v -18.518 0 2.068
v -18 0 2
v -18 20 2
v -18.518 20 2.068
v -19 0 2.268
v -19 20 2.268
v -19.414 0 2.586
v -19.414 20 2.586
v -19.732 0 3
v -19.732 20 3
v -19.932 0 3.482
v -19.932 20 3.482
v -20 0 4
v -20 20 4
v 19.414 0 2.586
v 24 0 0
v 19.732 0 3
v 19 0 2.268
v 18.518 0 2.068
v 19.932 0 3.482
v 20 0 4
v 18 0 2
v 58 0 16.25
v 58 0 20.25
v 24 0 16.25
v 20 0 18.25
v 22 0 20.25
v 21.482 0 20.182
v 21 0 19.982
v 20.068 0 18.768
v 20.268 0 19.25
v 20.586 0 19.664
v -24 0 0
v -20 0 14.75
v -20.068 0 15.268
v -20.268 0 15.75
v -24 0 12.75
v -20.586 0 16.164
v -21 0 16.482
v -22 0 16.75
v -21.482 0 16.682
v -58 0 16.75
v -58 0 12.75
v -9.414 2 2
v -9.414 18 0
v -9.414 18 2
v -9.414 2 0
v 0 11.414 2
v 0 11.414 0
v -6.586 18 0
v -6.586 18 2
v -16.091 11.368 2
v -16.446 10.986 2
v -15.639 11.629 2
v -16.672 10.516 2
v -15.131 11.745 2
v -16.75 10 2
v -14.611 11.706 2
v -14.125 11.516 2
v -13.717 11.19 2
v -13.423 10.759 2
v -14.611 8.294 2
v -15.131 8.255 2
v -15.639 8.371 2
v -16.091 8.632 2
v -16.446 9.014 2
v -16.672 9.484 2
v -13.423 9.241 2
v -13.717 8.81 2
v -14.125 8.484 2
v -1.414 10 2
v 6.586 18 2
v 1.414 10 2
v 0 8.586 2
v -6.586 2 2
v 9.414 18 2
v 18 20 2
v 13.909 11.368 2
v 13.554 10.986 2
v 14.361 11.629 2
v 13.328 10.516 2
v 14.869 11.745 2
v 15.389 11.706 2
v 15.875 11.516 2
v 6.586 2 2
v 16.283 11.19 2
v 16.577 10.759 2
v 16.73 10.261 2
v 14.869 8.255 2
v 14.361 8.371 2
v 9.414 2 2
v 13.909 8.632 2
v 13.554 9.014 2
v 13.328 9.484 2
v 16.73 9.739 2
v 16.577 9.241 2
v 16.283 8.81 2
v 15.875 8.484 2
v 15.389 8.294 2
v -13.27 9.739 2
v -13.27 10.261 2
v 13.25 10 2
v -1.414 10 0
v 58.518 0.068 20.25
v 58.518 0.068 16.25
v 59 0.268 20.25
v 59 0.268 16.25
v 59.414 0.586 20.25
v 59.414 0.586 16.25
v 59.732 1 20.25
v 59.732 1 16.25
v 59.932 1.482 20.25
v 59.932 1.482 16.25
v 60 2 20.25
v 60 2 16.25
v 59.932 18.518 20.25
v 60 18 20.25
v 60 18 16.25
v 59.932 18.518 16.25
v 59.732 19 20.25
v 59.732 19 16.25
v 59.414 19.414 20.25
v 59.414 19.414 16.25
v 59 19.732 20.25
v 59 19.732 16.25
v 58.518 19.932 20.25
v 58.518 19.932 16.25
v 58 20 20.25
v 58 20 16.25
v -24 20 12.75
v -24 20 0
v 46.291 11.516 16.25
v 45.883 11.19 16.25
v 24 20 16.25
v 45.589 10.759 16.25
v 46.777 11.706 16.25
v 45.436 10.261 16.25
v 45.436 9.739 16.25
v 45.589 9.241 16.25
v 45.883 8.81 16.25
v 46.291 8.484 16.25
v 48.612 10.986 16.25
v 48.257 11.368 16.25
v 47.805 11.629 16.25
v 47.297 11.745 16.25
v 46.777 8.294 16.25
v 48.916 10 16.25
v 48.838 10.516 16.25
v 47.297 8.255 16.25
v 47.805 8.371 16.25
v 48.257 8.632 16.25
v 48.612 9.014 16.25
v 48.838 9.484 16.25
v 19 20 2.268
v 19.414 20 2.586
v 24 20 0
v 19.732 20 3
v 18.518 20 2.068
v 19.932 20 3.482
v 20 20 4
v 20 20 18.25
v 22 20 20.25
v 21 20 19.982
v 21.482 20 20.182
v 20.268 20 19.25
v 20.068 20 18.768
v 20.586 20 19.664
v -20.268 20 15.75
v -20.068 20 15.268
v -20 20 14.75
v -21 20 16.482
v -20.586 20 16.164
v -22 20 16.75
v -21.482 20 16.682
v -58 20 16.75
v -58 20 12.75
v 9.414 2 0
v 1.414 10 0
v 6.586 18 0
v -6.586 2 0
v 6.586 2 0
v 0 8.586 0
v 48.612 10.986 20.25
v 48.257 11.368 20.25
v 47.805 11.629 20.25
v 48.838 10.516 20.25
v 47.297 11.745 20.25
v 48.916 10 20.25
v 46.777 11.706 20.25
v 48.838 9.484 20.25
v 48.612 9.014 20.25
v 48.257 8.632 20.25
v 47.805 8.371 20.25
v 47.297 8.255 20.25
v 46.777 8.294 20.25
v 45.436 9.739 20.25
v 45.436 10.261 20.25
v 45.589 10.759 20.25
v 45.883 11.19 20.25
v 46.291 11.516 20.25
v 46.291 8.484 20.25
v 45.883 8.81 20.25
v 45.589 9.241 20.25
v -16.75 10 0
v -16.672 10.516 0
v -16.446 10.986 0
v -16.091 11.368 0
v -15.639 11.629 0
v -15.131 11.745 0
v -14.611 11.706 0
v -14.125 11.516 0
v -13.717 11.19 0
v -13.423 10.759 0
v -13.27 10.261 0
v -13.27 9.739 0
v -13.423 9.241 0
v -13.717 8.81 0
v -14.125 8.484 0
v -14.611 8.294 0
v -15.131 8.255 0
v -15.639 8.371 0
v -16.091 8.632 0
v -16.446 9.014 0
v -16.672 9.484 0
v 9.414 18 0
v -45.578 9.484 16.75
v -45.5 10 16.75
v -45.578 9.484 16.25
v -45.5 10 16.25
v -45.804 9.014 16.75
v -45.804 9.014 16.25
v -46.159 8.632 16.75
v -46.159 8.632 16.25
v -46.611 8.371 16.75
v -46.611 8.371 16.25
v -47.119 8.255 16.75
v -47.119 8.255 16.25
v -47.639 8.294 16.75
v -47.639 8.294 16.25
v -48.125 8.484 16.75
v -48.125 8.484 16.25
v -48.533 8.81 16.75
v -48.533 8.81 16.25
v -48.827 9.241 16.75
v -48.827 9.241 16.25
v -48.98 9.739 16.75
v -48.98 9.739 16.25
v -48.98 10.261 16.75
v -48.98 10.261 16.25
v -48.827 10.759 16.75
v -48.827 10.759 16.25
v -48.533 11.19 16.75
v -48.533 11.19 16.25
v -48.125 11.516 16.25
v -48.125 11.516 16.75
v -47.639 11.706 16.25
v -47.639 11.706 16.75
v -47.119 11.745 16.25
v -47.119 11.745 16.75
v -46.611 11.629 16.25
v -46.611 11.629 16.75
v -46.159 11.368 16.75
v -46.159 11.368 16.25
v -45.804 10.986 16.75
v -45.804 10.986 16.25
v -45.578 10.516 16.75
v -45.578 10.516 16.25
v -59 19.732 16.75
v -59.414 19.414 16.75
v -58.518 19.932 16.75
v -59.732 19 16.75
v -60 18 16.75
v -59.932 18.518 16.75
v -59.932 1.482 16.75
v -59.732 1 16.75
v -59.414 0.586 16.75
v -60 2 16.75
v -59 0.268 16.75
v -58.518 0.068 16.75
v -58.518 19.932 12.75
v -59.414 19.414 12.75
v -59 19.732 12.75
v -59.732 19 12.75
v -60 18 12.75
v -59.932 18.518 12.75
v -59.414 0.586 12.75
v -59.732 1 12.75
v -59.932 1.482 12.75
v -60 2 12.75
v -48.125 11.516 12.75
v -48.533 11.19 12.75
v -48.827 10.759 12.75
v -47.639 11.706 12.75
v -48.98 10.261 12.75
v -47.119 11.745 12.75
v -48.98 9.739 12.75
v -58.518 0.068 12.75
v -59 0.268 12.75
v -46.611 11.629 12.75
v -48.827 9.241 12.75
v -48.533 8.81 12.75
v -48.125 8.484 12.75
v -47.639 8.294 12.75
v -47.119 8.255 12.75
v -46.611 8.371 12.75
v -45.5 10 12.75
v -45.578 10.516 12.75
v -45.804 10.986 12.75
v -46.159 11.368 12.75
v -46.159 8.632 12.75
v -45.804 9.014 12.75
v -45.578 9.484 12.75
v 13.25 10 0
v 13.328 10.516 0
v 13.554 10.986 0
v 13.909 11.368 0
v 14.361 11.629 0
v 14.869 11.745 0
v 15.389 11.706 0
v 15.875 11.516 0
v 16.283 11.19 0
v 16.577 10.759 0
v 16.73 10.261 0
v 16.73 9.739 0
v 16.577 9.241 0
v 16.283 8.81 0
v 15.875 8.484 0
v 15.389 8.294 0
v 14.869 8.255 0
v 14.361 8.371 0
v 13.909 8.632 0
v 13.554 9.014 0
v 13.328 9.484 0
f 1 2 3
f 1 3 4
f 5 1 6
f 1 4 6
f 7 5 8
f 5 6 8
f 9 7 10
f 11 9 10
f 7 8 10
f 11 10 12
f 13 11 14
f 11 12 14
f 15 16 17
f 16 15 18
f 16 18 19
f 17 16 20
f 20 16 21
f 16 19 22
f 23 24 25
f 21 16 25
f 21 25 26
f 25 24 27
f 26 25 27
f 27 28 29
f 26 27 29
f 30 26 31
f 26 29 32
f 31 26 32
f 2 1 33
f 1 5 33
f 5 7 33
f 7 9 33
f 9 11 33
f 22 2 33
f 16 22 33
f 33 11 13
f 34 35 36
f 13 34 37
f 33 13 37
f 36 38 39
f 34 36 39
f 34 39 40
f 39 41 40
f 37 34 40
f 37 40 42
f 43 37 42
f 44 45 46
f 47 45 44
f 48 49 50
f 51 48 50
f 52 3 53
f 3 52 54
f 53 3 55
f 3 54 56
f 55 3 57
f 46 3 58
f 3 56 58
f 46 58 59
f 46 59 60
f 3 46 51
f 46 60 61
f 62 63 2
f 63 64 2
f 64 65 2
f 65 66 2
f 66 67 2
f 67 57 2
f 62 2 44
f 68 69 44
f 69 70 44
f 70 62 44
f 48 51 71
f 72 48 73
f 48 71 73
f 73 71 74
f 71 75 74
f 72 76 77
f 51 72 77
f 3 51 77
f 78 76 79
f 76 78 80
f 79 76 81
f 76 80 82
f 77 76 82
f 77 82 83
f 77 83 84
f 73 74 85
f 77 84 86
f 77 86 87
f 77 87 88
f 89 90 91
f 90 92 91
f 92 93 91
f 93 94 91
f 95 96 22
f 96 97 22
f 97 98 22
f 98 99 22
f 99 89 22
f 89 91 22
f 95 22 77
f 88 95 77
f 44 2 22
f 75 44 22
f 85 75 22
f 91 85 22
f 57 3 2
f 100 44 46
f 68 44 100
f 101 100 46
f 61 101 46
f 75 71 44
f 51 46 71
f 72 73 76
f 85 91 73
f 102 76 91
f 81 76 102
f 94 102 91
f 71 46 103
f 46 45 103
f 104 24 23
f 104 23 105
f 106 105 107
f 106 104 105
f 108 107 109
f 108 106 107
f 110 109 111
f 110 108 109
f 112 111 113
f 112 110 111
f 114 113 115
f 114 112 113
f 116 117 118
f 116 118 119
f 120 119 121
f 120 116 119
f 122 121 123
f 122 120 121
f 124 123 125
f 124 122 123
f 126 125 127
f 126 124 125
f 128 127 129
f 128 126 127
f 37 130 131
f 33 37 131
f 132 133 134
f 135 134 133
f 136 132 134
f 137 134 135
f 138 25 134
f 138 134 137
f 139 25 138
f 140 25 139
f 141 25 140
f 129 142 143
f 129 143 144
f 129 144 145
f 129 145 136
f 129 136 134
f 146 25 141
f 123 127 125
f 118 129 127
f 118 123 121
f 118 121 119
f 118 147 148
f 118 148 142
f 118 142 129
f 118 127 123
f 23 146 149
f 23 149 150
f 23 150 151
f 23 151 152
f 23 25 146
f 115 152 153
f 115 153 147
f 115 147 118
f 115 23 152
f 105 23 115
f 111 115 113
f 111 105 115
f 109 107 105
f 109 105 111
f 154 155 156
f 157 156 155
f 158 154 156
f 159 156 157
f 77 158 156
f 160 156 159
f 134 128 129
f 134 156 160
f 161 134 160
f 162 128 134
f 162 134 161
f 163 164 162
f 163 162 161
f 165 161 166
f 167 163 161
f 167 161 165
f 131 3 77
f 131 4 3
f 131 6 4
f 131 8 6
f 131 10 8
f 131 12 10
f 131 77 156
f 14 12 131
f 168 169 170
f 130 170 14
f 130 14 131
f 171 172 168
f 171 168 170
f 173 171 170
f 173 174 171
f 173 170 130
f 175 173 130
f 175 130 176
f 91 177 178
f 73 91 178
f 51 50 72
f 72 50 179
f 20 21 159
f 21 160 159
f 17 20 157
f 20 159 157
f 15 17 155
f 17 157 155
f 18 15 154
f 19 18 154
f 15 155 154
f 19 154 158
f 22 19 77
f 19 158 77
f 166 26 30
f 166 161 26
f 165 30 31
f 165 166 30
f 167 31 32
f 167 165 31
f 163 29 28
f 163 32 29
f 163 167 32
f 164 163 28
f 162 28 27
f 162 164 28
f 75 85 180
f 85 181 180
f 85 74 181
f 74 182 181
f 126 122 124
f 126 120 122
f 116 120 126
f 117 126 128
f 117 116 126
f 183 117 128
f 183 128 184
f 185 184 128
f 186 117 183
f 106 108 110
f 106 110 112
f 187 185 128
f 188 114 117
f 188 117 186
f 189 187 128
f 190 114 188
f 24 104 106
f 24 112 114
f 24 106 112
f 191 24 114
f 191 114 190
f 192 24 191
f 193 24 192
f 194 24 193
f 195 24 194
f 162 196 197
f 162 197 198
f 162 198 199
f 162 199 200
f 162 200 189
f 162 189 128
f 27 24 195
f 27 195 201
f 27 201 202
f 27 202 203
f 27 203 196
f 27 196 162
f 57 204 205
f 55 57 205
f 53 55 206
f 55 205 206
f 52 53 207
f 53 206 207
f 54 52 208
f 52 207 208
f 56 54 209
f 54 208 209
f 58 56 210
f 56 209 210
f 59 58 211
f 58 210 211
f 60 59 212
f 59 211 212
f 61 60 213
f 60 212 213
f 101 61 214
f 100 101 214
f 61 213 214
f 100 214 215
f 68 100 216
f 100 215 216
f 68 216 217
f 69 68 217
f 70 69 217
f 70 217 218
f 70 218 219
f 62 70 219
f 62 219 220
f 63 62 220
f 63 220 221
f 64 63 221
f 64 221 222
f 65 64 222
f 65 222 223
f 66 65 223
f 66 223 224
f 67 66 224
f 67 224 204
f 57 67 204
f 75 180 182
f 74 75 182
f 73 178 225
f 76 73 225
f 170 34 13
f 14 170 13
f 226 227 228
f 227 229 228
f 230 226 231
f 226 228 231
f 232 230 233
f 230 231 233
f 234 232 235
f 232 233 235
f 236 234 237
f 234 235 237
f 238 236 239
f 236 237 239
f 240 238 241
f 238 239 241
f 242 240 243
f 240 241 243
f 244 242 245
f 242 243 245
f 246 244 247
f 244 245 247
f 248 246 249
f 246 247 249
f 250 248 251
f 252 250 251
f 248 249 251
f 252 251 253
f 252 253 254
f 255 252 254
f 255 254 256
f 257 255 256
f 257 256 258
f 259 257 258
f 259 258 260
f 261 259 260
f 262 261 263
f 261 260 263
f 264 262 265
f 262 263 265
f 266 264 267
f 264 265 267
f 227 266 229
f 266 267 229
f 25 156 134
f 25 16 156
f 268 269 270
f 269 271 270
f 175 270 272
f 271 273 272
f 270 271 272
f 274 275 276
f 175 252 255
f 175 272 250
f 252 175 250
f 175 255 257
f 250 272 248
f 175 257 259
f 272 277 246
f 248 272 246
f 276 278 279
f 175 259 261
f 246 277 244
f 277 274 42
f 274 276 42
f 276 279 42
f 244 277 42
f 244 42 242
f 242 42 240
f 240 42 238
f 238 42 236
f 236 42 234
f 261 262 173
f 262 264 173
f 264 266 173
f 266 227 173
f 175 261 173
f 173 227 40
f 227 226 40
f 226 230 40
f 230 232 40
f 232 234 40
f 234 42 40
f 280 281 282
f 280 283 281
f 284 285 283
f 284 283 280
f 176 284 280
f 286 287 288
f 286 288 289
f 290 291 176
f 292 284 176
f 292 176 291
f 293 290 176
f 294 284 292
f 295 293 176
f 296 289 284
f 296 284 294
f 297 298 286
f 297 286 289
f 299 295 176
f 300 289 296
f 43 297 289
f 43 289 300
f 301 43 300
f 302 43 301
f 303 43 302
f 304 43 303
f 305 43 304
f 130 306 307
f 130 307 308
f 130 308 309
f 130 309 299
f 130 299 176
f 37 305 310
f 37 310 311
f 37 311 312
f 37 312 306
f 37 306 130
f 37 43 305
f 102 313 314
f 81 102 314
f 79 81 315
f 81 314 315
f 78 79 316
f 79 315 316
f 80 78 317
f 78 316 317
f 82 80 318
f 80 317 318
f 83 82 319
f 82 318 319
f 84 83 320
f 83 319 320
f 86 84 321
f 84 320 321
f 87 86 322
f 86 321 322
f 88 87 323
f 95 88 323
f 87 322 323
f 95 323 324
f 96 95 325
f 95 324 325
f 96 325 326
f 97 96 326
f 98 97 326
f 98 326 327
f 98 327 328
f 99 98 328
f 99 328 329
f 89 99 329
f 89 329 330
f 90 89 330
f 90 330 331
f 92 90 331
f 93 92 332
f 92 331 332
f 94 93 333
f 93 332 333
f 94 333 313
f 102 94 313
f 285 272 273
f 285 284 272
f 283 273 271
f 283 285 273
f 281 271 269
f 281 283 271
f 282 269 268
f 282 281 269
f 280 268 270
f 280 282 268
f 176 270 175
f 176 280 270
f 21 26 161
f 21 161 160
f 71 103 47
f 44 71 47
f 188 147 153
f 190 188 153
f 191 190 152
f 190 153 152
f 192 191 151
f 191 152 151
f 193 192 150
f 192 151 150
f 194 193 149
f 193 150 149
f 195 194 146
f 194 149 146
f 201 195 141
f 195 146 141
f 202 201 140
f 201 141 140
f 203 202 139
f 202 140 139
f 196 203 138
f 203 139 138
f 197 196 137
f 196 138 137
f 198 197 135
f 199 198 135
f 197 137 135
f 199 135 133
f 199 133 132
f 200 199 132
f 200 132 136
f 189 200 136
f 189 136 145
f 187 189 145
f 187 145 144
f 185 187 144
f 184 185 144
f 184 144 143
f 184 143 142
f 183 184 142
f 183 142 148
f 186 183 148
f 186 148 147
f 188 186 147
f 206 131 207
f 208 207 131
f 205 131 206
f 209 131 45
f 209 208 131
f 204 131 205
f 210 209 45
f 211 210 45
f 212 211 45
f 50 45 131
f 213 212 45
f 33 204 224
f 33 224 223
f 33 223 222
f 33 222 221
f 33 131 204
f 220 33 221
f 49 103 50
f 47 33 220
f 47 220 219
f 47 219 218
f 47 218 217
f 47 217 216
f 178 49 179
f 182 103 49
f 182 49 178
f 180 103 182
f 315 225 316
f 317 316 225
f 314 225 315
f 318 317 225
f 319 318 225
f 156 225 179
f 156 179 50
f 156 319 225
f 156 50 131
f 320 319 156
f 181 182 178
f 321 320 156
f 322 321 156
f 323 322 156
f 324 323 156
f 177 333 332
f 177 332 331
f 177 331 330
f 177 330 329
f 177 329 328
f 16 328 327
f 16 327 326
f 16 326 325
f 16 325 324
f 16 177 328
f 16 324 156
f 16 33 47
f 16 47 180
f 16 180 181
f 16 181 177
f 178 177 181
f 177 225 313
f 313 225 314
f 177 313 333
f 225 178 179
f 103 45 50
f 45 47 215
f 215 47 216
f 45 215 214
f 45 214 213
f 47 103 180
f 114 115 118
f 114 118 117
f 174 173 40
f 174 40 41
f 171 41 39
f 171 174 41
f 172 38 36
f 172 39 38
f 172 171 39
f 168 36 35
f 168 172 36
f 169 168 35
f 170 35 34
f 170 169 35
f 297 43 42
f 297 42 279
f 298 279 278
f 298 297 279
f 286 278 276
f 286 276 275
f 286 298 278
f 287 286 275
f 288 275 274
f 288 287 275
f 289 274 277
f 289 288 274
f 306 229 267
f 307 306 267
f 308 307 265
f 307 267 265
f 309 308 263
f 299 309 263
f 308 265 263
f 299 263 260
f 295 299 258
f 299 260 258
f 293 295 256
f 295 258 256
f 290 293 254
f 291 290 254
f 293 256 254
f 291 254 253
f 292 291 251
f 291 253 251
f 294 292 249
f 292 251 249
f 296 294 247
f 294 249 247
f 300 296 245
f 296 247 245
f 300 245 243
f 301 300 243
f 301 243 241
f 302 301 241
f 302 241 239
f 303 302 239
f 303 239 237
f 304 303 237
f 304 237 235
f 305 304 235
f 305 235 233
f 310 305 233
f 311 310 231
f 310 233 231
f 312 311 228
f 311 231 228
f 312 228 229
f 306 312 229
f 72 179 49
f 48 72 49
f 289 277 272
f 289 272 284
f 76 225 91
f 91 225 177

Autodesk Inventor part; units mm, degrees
ref_plane "YZ Plane" through (0, 0, 0) normal (1, 0, 0) x (0, 1, 0)
ref_plane "XZ Plane" through (0, 0, 0) normal (0, 1, 0) x (-1, 0, 0)
ref_plane "XY Plane" through (0, 0, 0) normal (0, 0, 1) x (1, 0, 0)
sketch "スケッチ1" plane through (0, 0, 0) normal (0, 1, 0) x (-1, 0, 0)
  line L0 (0, 20.7547) -> (0, -42.4528)
  line L1 (60, 16.75) -> (20, 16.75)
  line L2 (20, 16.75) -> (20, 2)
  line L3 (20, 2) -> (0, 2)
  line L4 (60, 16.75) -> (60, 12.75)
  line L5 (60, 12.75) -> (24, 12.75)
  line L6 (24, 12.75) -> (24, 0)
  line L7 (24, 0) -> (0, 0)
  line L8 (-20, 2) -> (0, 2)
  line L9 (-24, 0) -> (0, 0)
  line L10 (-24, 0) -> (-24, 16.25)
  line L11 (-24, 16.25) -> (-60, 16.25)
  line L12 (-60, 16.25) -> (-60, 20.25)
  line L13 (-60, 20.25) -> (-20, 20.25)
  line L14 (-20, 20.25) -> (-20, 2)
  dimension "d0" = 40
  dimension "d1" = 4
  dimension "d2" = 36
  dimension "d4" = 2
  dimension "d5" = 40
  dimension "d20" = 12.75
  dimension "d21" = 16.25
  dimension "d22" = 4
  dimension "d23" = 40
  dimension "d24" = 4
extrude "押し出し1" add sketch "スケッチ1" along normal blind 20
sketch "スケッチ2" plane through (24, 0, 0) normal (0, 0, -1) x (-1, 0, 0)
  line L0 (0, 10) -> (48, 10)
  line L1 (48, 0) -> (48, 20) projected
  line L2 (24, 0) -> (24, 20)
  line L3 (0, 20) -> (48, 20) projected
  circle A0 centre (9, 10) radius 1.75
  line L4 (14.5858, 18) -> (14.5858, 2)
  line L5 (14.5858, 2) -> (30.5858, 2)
  line L6 (30.5858, 2) -> (14.5858, 18)
  circle A1 centre (39, 10) radius 1.75
  line L7 (33.4142, 18) -> (33.4142, 2)
  line L8 (33.4142, 18) -> (17.4142, 18)
  line L9 (17.4142, 18) -> (33.4142, 2)
  line L10 (33.4142, 18) -> (17.4142, 2)
  line L11 (14.5858, 2) -> (30.5858, 18)
  point P0 (25.4142, 10)
  point P1 (24, 8.5858)
  point P2 (22.5858, 10)
  point P3 (24, 11.4142)
  dimension "d8" = 16
  dimension "d9" = 3.5
  dimension "d11" = 30
  dimension "d19" = 2
  dimension "d27" = 2
extrude "押し出し2" cut sketch "スケッチ2" against normal through all contours A1 L0 | L0 A1 | A0 L0 | L0 A0 | L7 L9 L0 | L0 L10 L7 | L8 L11 L2 | L2 L9 L8 | L6 L5 L2 | L2 L5 L10 | L11 L4 L0 | L0 L4 L6
sketch "スケッチ3" plane through (20, 0, 16.25) normal (0, 0, 1) x (1, 0, 0)
  line L0 (-80, 0) -> (-80, 20) projected
  line L1 (-80, 10) -> (40, 10)
  circle A0 centre (27.1661, 10) radius 1.75
  circle A1 centre (-67.25, 10) radius 1.75
  line L2 (40, 0) -> (40, 20) projected
  point P0 (-20, 0)
  dimension "d14" = 3.5
  dimension "d16" = 12.75
extrude "押し出し3" cut sketch "スケッチ3" along normal through all both and the other way through all
fillet "フィレット1" radius 2 4 edges at (60, 20, 18.25) (60, 0, 18.25) (-60, 20, 14.75) (-60, 0, 14.75)
fillet "フィレット2" radius 2 4 edges at (-20, 10, 16.75) (-20, 10, 2) (20, 10, 2) (20, 10, 20.25)
properties part number "joint2_sup"
